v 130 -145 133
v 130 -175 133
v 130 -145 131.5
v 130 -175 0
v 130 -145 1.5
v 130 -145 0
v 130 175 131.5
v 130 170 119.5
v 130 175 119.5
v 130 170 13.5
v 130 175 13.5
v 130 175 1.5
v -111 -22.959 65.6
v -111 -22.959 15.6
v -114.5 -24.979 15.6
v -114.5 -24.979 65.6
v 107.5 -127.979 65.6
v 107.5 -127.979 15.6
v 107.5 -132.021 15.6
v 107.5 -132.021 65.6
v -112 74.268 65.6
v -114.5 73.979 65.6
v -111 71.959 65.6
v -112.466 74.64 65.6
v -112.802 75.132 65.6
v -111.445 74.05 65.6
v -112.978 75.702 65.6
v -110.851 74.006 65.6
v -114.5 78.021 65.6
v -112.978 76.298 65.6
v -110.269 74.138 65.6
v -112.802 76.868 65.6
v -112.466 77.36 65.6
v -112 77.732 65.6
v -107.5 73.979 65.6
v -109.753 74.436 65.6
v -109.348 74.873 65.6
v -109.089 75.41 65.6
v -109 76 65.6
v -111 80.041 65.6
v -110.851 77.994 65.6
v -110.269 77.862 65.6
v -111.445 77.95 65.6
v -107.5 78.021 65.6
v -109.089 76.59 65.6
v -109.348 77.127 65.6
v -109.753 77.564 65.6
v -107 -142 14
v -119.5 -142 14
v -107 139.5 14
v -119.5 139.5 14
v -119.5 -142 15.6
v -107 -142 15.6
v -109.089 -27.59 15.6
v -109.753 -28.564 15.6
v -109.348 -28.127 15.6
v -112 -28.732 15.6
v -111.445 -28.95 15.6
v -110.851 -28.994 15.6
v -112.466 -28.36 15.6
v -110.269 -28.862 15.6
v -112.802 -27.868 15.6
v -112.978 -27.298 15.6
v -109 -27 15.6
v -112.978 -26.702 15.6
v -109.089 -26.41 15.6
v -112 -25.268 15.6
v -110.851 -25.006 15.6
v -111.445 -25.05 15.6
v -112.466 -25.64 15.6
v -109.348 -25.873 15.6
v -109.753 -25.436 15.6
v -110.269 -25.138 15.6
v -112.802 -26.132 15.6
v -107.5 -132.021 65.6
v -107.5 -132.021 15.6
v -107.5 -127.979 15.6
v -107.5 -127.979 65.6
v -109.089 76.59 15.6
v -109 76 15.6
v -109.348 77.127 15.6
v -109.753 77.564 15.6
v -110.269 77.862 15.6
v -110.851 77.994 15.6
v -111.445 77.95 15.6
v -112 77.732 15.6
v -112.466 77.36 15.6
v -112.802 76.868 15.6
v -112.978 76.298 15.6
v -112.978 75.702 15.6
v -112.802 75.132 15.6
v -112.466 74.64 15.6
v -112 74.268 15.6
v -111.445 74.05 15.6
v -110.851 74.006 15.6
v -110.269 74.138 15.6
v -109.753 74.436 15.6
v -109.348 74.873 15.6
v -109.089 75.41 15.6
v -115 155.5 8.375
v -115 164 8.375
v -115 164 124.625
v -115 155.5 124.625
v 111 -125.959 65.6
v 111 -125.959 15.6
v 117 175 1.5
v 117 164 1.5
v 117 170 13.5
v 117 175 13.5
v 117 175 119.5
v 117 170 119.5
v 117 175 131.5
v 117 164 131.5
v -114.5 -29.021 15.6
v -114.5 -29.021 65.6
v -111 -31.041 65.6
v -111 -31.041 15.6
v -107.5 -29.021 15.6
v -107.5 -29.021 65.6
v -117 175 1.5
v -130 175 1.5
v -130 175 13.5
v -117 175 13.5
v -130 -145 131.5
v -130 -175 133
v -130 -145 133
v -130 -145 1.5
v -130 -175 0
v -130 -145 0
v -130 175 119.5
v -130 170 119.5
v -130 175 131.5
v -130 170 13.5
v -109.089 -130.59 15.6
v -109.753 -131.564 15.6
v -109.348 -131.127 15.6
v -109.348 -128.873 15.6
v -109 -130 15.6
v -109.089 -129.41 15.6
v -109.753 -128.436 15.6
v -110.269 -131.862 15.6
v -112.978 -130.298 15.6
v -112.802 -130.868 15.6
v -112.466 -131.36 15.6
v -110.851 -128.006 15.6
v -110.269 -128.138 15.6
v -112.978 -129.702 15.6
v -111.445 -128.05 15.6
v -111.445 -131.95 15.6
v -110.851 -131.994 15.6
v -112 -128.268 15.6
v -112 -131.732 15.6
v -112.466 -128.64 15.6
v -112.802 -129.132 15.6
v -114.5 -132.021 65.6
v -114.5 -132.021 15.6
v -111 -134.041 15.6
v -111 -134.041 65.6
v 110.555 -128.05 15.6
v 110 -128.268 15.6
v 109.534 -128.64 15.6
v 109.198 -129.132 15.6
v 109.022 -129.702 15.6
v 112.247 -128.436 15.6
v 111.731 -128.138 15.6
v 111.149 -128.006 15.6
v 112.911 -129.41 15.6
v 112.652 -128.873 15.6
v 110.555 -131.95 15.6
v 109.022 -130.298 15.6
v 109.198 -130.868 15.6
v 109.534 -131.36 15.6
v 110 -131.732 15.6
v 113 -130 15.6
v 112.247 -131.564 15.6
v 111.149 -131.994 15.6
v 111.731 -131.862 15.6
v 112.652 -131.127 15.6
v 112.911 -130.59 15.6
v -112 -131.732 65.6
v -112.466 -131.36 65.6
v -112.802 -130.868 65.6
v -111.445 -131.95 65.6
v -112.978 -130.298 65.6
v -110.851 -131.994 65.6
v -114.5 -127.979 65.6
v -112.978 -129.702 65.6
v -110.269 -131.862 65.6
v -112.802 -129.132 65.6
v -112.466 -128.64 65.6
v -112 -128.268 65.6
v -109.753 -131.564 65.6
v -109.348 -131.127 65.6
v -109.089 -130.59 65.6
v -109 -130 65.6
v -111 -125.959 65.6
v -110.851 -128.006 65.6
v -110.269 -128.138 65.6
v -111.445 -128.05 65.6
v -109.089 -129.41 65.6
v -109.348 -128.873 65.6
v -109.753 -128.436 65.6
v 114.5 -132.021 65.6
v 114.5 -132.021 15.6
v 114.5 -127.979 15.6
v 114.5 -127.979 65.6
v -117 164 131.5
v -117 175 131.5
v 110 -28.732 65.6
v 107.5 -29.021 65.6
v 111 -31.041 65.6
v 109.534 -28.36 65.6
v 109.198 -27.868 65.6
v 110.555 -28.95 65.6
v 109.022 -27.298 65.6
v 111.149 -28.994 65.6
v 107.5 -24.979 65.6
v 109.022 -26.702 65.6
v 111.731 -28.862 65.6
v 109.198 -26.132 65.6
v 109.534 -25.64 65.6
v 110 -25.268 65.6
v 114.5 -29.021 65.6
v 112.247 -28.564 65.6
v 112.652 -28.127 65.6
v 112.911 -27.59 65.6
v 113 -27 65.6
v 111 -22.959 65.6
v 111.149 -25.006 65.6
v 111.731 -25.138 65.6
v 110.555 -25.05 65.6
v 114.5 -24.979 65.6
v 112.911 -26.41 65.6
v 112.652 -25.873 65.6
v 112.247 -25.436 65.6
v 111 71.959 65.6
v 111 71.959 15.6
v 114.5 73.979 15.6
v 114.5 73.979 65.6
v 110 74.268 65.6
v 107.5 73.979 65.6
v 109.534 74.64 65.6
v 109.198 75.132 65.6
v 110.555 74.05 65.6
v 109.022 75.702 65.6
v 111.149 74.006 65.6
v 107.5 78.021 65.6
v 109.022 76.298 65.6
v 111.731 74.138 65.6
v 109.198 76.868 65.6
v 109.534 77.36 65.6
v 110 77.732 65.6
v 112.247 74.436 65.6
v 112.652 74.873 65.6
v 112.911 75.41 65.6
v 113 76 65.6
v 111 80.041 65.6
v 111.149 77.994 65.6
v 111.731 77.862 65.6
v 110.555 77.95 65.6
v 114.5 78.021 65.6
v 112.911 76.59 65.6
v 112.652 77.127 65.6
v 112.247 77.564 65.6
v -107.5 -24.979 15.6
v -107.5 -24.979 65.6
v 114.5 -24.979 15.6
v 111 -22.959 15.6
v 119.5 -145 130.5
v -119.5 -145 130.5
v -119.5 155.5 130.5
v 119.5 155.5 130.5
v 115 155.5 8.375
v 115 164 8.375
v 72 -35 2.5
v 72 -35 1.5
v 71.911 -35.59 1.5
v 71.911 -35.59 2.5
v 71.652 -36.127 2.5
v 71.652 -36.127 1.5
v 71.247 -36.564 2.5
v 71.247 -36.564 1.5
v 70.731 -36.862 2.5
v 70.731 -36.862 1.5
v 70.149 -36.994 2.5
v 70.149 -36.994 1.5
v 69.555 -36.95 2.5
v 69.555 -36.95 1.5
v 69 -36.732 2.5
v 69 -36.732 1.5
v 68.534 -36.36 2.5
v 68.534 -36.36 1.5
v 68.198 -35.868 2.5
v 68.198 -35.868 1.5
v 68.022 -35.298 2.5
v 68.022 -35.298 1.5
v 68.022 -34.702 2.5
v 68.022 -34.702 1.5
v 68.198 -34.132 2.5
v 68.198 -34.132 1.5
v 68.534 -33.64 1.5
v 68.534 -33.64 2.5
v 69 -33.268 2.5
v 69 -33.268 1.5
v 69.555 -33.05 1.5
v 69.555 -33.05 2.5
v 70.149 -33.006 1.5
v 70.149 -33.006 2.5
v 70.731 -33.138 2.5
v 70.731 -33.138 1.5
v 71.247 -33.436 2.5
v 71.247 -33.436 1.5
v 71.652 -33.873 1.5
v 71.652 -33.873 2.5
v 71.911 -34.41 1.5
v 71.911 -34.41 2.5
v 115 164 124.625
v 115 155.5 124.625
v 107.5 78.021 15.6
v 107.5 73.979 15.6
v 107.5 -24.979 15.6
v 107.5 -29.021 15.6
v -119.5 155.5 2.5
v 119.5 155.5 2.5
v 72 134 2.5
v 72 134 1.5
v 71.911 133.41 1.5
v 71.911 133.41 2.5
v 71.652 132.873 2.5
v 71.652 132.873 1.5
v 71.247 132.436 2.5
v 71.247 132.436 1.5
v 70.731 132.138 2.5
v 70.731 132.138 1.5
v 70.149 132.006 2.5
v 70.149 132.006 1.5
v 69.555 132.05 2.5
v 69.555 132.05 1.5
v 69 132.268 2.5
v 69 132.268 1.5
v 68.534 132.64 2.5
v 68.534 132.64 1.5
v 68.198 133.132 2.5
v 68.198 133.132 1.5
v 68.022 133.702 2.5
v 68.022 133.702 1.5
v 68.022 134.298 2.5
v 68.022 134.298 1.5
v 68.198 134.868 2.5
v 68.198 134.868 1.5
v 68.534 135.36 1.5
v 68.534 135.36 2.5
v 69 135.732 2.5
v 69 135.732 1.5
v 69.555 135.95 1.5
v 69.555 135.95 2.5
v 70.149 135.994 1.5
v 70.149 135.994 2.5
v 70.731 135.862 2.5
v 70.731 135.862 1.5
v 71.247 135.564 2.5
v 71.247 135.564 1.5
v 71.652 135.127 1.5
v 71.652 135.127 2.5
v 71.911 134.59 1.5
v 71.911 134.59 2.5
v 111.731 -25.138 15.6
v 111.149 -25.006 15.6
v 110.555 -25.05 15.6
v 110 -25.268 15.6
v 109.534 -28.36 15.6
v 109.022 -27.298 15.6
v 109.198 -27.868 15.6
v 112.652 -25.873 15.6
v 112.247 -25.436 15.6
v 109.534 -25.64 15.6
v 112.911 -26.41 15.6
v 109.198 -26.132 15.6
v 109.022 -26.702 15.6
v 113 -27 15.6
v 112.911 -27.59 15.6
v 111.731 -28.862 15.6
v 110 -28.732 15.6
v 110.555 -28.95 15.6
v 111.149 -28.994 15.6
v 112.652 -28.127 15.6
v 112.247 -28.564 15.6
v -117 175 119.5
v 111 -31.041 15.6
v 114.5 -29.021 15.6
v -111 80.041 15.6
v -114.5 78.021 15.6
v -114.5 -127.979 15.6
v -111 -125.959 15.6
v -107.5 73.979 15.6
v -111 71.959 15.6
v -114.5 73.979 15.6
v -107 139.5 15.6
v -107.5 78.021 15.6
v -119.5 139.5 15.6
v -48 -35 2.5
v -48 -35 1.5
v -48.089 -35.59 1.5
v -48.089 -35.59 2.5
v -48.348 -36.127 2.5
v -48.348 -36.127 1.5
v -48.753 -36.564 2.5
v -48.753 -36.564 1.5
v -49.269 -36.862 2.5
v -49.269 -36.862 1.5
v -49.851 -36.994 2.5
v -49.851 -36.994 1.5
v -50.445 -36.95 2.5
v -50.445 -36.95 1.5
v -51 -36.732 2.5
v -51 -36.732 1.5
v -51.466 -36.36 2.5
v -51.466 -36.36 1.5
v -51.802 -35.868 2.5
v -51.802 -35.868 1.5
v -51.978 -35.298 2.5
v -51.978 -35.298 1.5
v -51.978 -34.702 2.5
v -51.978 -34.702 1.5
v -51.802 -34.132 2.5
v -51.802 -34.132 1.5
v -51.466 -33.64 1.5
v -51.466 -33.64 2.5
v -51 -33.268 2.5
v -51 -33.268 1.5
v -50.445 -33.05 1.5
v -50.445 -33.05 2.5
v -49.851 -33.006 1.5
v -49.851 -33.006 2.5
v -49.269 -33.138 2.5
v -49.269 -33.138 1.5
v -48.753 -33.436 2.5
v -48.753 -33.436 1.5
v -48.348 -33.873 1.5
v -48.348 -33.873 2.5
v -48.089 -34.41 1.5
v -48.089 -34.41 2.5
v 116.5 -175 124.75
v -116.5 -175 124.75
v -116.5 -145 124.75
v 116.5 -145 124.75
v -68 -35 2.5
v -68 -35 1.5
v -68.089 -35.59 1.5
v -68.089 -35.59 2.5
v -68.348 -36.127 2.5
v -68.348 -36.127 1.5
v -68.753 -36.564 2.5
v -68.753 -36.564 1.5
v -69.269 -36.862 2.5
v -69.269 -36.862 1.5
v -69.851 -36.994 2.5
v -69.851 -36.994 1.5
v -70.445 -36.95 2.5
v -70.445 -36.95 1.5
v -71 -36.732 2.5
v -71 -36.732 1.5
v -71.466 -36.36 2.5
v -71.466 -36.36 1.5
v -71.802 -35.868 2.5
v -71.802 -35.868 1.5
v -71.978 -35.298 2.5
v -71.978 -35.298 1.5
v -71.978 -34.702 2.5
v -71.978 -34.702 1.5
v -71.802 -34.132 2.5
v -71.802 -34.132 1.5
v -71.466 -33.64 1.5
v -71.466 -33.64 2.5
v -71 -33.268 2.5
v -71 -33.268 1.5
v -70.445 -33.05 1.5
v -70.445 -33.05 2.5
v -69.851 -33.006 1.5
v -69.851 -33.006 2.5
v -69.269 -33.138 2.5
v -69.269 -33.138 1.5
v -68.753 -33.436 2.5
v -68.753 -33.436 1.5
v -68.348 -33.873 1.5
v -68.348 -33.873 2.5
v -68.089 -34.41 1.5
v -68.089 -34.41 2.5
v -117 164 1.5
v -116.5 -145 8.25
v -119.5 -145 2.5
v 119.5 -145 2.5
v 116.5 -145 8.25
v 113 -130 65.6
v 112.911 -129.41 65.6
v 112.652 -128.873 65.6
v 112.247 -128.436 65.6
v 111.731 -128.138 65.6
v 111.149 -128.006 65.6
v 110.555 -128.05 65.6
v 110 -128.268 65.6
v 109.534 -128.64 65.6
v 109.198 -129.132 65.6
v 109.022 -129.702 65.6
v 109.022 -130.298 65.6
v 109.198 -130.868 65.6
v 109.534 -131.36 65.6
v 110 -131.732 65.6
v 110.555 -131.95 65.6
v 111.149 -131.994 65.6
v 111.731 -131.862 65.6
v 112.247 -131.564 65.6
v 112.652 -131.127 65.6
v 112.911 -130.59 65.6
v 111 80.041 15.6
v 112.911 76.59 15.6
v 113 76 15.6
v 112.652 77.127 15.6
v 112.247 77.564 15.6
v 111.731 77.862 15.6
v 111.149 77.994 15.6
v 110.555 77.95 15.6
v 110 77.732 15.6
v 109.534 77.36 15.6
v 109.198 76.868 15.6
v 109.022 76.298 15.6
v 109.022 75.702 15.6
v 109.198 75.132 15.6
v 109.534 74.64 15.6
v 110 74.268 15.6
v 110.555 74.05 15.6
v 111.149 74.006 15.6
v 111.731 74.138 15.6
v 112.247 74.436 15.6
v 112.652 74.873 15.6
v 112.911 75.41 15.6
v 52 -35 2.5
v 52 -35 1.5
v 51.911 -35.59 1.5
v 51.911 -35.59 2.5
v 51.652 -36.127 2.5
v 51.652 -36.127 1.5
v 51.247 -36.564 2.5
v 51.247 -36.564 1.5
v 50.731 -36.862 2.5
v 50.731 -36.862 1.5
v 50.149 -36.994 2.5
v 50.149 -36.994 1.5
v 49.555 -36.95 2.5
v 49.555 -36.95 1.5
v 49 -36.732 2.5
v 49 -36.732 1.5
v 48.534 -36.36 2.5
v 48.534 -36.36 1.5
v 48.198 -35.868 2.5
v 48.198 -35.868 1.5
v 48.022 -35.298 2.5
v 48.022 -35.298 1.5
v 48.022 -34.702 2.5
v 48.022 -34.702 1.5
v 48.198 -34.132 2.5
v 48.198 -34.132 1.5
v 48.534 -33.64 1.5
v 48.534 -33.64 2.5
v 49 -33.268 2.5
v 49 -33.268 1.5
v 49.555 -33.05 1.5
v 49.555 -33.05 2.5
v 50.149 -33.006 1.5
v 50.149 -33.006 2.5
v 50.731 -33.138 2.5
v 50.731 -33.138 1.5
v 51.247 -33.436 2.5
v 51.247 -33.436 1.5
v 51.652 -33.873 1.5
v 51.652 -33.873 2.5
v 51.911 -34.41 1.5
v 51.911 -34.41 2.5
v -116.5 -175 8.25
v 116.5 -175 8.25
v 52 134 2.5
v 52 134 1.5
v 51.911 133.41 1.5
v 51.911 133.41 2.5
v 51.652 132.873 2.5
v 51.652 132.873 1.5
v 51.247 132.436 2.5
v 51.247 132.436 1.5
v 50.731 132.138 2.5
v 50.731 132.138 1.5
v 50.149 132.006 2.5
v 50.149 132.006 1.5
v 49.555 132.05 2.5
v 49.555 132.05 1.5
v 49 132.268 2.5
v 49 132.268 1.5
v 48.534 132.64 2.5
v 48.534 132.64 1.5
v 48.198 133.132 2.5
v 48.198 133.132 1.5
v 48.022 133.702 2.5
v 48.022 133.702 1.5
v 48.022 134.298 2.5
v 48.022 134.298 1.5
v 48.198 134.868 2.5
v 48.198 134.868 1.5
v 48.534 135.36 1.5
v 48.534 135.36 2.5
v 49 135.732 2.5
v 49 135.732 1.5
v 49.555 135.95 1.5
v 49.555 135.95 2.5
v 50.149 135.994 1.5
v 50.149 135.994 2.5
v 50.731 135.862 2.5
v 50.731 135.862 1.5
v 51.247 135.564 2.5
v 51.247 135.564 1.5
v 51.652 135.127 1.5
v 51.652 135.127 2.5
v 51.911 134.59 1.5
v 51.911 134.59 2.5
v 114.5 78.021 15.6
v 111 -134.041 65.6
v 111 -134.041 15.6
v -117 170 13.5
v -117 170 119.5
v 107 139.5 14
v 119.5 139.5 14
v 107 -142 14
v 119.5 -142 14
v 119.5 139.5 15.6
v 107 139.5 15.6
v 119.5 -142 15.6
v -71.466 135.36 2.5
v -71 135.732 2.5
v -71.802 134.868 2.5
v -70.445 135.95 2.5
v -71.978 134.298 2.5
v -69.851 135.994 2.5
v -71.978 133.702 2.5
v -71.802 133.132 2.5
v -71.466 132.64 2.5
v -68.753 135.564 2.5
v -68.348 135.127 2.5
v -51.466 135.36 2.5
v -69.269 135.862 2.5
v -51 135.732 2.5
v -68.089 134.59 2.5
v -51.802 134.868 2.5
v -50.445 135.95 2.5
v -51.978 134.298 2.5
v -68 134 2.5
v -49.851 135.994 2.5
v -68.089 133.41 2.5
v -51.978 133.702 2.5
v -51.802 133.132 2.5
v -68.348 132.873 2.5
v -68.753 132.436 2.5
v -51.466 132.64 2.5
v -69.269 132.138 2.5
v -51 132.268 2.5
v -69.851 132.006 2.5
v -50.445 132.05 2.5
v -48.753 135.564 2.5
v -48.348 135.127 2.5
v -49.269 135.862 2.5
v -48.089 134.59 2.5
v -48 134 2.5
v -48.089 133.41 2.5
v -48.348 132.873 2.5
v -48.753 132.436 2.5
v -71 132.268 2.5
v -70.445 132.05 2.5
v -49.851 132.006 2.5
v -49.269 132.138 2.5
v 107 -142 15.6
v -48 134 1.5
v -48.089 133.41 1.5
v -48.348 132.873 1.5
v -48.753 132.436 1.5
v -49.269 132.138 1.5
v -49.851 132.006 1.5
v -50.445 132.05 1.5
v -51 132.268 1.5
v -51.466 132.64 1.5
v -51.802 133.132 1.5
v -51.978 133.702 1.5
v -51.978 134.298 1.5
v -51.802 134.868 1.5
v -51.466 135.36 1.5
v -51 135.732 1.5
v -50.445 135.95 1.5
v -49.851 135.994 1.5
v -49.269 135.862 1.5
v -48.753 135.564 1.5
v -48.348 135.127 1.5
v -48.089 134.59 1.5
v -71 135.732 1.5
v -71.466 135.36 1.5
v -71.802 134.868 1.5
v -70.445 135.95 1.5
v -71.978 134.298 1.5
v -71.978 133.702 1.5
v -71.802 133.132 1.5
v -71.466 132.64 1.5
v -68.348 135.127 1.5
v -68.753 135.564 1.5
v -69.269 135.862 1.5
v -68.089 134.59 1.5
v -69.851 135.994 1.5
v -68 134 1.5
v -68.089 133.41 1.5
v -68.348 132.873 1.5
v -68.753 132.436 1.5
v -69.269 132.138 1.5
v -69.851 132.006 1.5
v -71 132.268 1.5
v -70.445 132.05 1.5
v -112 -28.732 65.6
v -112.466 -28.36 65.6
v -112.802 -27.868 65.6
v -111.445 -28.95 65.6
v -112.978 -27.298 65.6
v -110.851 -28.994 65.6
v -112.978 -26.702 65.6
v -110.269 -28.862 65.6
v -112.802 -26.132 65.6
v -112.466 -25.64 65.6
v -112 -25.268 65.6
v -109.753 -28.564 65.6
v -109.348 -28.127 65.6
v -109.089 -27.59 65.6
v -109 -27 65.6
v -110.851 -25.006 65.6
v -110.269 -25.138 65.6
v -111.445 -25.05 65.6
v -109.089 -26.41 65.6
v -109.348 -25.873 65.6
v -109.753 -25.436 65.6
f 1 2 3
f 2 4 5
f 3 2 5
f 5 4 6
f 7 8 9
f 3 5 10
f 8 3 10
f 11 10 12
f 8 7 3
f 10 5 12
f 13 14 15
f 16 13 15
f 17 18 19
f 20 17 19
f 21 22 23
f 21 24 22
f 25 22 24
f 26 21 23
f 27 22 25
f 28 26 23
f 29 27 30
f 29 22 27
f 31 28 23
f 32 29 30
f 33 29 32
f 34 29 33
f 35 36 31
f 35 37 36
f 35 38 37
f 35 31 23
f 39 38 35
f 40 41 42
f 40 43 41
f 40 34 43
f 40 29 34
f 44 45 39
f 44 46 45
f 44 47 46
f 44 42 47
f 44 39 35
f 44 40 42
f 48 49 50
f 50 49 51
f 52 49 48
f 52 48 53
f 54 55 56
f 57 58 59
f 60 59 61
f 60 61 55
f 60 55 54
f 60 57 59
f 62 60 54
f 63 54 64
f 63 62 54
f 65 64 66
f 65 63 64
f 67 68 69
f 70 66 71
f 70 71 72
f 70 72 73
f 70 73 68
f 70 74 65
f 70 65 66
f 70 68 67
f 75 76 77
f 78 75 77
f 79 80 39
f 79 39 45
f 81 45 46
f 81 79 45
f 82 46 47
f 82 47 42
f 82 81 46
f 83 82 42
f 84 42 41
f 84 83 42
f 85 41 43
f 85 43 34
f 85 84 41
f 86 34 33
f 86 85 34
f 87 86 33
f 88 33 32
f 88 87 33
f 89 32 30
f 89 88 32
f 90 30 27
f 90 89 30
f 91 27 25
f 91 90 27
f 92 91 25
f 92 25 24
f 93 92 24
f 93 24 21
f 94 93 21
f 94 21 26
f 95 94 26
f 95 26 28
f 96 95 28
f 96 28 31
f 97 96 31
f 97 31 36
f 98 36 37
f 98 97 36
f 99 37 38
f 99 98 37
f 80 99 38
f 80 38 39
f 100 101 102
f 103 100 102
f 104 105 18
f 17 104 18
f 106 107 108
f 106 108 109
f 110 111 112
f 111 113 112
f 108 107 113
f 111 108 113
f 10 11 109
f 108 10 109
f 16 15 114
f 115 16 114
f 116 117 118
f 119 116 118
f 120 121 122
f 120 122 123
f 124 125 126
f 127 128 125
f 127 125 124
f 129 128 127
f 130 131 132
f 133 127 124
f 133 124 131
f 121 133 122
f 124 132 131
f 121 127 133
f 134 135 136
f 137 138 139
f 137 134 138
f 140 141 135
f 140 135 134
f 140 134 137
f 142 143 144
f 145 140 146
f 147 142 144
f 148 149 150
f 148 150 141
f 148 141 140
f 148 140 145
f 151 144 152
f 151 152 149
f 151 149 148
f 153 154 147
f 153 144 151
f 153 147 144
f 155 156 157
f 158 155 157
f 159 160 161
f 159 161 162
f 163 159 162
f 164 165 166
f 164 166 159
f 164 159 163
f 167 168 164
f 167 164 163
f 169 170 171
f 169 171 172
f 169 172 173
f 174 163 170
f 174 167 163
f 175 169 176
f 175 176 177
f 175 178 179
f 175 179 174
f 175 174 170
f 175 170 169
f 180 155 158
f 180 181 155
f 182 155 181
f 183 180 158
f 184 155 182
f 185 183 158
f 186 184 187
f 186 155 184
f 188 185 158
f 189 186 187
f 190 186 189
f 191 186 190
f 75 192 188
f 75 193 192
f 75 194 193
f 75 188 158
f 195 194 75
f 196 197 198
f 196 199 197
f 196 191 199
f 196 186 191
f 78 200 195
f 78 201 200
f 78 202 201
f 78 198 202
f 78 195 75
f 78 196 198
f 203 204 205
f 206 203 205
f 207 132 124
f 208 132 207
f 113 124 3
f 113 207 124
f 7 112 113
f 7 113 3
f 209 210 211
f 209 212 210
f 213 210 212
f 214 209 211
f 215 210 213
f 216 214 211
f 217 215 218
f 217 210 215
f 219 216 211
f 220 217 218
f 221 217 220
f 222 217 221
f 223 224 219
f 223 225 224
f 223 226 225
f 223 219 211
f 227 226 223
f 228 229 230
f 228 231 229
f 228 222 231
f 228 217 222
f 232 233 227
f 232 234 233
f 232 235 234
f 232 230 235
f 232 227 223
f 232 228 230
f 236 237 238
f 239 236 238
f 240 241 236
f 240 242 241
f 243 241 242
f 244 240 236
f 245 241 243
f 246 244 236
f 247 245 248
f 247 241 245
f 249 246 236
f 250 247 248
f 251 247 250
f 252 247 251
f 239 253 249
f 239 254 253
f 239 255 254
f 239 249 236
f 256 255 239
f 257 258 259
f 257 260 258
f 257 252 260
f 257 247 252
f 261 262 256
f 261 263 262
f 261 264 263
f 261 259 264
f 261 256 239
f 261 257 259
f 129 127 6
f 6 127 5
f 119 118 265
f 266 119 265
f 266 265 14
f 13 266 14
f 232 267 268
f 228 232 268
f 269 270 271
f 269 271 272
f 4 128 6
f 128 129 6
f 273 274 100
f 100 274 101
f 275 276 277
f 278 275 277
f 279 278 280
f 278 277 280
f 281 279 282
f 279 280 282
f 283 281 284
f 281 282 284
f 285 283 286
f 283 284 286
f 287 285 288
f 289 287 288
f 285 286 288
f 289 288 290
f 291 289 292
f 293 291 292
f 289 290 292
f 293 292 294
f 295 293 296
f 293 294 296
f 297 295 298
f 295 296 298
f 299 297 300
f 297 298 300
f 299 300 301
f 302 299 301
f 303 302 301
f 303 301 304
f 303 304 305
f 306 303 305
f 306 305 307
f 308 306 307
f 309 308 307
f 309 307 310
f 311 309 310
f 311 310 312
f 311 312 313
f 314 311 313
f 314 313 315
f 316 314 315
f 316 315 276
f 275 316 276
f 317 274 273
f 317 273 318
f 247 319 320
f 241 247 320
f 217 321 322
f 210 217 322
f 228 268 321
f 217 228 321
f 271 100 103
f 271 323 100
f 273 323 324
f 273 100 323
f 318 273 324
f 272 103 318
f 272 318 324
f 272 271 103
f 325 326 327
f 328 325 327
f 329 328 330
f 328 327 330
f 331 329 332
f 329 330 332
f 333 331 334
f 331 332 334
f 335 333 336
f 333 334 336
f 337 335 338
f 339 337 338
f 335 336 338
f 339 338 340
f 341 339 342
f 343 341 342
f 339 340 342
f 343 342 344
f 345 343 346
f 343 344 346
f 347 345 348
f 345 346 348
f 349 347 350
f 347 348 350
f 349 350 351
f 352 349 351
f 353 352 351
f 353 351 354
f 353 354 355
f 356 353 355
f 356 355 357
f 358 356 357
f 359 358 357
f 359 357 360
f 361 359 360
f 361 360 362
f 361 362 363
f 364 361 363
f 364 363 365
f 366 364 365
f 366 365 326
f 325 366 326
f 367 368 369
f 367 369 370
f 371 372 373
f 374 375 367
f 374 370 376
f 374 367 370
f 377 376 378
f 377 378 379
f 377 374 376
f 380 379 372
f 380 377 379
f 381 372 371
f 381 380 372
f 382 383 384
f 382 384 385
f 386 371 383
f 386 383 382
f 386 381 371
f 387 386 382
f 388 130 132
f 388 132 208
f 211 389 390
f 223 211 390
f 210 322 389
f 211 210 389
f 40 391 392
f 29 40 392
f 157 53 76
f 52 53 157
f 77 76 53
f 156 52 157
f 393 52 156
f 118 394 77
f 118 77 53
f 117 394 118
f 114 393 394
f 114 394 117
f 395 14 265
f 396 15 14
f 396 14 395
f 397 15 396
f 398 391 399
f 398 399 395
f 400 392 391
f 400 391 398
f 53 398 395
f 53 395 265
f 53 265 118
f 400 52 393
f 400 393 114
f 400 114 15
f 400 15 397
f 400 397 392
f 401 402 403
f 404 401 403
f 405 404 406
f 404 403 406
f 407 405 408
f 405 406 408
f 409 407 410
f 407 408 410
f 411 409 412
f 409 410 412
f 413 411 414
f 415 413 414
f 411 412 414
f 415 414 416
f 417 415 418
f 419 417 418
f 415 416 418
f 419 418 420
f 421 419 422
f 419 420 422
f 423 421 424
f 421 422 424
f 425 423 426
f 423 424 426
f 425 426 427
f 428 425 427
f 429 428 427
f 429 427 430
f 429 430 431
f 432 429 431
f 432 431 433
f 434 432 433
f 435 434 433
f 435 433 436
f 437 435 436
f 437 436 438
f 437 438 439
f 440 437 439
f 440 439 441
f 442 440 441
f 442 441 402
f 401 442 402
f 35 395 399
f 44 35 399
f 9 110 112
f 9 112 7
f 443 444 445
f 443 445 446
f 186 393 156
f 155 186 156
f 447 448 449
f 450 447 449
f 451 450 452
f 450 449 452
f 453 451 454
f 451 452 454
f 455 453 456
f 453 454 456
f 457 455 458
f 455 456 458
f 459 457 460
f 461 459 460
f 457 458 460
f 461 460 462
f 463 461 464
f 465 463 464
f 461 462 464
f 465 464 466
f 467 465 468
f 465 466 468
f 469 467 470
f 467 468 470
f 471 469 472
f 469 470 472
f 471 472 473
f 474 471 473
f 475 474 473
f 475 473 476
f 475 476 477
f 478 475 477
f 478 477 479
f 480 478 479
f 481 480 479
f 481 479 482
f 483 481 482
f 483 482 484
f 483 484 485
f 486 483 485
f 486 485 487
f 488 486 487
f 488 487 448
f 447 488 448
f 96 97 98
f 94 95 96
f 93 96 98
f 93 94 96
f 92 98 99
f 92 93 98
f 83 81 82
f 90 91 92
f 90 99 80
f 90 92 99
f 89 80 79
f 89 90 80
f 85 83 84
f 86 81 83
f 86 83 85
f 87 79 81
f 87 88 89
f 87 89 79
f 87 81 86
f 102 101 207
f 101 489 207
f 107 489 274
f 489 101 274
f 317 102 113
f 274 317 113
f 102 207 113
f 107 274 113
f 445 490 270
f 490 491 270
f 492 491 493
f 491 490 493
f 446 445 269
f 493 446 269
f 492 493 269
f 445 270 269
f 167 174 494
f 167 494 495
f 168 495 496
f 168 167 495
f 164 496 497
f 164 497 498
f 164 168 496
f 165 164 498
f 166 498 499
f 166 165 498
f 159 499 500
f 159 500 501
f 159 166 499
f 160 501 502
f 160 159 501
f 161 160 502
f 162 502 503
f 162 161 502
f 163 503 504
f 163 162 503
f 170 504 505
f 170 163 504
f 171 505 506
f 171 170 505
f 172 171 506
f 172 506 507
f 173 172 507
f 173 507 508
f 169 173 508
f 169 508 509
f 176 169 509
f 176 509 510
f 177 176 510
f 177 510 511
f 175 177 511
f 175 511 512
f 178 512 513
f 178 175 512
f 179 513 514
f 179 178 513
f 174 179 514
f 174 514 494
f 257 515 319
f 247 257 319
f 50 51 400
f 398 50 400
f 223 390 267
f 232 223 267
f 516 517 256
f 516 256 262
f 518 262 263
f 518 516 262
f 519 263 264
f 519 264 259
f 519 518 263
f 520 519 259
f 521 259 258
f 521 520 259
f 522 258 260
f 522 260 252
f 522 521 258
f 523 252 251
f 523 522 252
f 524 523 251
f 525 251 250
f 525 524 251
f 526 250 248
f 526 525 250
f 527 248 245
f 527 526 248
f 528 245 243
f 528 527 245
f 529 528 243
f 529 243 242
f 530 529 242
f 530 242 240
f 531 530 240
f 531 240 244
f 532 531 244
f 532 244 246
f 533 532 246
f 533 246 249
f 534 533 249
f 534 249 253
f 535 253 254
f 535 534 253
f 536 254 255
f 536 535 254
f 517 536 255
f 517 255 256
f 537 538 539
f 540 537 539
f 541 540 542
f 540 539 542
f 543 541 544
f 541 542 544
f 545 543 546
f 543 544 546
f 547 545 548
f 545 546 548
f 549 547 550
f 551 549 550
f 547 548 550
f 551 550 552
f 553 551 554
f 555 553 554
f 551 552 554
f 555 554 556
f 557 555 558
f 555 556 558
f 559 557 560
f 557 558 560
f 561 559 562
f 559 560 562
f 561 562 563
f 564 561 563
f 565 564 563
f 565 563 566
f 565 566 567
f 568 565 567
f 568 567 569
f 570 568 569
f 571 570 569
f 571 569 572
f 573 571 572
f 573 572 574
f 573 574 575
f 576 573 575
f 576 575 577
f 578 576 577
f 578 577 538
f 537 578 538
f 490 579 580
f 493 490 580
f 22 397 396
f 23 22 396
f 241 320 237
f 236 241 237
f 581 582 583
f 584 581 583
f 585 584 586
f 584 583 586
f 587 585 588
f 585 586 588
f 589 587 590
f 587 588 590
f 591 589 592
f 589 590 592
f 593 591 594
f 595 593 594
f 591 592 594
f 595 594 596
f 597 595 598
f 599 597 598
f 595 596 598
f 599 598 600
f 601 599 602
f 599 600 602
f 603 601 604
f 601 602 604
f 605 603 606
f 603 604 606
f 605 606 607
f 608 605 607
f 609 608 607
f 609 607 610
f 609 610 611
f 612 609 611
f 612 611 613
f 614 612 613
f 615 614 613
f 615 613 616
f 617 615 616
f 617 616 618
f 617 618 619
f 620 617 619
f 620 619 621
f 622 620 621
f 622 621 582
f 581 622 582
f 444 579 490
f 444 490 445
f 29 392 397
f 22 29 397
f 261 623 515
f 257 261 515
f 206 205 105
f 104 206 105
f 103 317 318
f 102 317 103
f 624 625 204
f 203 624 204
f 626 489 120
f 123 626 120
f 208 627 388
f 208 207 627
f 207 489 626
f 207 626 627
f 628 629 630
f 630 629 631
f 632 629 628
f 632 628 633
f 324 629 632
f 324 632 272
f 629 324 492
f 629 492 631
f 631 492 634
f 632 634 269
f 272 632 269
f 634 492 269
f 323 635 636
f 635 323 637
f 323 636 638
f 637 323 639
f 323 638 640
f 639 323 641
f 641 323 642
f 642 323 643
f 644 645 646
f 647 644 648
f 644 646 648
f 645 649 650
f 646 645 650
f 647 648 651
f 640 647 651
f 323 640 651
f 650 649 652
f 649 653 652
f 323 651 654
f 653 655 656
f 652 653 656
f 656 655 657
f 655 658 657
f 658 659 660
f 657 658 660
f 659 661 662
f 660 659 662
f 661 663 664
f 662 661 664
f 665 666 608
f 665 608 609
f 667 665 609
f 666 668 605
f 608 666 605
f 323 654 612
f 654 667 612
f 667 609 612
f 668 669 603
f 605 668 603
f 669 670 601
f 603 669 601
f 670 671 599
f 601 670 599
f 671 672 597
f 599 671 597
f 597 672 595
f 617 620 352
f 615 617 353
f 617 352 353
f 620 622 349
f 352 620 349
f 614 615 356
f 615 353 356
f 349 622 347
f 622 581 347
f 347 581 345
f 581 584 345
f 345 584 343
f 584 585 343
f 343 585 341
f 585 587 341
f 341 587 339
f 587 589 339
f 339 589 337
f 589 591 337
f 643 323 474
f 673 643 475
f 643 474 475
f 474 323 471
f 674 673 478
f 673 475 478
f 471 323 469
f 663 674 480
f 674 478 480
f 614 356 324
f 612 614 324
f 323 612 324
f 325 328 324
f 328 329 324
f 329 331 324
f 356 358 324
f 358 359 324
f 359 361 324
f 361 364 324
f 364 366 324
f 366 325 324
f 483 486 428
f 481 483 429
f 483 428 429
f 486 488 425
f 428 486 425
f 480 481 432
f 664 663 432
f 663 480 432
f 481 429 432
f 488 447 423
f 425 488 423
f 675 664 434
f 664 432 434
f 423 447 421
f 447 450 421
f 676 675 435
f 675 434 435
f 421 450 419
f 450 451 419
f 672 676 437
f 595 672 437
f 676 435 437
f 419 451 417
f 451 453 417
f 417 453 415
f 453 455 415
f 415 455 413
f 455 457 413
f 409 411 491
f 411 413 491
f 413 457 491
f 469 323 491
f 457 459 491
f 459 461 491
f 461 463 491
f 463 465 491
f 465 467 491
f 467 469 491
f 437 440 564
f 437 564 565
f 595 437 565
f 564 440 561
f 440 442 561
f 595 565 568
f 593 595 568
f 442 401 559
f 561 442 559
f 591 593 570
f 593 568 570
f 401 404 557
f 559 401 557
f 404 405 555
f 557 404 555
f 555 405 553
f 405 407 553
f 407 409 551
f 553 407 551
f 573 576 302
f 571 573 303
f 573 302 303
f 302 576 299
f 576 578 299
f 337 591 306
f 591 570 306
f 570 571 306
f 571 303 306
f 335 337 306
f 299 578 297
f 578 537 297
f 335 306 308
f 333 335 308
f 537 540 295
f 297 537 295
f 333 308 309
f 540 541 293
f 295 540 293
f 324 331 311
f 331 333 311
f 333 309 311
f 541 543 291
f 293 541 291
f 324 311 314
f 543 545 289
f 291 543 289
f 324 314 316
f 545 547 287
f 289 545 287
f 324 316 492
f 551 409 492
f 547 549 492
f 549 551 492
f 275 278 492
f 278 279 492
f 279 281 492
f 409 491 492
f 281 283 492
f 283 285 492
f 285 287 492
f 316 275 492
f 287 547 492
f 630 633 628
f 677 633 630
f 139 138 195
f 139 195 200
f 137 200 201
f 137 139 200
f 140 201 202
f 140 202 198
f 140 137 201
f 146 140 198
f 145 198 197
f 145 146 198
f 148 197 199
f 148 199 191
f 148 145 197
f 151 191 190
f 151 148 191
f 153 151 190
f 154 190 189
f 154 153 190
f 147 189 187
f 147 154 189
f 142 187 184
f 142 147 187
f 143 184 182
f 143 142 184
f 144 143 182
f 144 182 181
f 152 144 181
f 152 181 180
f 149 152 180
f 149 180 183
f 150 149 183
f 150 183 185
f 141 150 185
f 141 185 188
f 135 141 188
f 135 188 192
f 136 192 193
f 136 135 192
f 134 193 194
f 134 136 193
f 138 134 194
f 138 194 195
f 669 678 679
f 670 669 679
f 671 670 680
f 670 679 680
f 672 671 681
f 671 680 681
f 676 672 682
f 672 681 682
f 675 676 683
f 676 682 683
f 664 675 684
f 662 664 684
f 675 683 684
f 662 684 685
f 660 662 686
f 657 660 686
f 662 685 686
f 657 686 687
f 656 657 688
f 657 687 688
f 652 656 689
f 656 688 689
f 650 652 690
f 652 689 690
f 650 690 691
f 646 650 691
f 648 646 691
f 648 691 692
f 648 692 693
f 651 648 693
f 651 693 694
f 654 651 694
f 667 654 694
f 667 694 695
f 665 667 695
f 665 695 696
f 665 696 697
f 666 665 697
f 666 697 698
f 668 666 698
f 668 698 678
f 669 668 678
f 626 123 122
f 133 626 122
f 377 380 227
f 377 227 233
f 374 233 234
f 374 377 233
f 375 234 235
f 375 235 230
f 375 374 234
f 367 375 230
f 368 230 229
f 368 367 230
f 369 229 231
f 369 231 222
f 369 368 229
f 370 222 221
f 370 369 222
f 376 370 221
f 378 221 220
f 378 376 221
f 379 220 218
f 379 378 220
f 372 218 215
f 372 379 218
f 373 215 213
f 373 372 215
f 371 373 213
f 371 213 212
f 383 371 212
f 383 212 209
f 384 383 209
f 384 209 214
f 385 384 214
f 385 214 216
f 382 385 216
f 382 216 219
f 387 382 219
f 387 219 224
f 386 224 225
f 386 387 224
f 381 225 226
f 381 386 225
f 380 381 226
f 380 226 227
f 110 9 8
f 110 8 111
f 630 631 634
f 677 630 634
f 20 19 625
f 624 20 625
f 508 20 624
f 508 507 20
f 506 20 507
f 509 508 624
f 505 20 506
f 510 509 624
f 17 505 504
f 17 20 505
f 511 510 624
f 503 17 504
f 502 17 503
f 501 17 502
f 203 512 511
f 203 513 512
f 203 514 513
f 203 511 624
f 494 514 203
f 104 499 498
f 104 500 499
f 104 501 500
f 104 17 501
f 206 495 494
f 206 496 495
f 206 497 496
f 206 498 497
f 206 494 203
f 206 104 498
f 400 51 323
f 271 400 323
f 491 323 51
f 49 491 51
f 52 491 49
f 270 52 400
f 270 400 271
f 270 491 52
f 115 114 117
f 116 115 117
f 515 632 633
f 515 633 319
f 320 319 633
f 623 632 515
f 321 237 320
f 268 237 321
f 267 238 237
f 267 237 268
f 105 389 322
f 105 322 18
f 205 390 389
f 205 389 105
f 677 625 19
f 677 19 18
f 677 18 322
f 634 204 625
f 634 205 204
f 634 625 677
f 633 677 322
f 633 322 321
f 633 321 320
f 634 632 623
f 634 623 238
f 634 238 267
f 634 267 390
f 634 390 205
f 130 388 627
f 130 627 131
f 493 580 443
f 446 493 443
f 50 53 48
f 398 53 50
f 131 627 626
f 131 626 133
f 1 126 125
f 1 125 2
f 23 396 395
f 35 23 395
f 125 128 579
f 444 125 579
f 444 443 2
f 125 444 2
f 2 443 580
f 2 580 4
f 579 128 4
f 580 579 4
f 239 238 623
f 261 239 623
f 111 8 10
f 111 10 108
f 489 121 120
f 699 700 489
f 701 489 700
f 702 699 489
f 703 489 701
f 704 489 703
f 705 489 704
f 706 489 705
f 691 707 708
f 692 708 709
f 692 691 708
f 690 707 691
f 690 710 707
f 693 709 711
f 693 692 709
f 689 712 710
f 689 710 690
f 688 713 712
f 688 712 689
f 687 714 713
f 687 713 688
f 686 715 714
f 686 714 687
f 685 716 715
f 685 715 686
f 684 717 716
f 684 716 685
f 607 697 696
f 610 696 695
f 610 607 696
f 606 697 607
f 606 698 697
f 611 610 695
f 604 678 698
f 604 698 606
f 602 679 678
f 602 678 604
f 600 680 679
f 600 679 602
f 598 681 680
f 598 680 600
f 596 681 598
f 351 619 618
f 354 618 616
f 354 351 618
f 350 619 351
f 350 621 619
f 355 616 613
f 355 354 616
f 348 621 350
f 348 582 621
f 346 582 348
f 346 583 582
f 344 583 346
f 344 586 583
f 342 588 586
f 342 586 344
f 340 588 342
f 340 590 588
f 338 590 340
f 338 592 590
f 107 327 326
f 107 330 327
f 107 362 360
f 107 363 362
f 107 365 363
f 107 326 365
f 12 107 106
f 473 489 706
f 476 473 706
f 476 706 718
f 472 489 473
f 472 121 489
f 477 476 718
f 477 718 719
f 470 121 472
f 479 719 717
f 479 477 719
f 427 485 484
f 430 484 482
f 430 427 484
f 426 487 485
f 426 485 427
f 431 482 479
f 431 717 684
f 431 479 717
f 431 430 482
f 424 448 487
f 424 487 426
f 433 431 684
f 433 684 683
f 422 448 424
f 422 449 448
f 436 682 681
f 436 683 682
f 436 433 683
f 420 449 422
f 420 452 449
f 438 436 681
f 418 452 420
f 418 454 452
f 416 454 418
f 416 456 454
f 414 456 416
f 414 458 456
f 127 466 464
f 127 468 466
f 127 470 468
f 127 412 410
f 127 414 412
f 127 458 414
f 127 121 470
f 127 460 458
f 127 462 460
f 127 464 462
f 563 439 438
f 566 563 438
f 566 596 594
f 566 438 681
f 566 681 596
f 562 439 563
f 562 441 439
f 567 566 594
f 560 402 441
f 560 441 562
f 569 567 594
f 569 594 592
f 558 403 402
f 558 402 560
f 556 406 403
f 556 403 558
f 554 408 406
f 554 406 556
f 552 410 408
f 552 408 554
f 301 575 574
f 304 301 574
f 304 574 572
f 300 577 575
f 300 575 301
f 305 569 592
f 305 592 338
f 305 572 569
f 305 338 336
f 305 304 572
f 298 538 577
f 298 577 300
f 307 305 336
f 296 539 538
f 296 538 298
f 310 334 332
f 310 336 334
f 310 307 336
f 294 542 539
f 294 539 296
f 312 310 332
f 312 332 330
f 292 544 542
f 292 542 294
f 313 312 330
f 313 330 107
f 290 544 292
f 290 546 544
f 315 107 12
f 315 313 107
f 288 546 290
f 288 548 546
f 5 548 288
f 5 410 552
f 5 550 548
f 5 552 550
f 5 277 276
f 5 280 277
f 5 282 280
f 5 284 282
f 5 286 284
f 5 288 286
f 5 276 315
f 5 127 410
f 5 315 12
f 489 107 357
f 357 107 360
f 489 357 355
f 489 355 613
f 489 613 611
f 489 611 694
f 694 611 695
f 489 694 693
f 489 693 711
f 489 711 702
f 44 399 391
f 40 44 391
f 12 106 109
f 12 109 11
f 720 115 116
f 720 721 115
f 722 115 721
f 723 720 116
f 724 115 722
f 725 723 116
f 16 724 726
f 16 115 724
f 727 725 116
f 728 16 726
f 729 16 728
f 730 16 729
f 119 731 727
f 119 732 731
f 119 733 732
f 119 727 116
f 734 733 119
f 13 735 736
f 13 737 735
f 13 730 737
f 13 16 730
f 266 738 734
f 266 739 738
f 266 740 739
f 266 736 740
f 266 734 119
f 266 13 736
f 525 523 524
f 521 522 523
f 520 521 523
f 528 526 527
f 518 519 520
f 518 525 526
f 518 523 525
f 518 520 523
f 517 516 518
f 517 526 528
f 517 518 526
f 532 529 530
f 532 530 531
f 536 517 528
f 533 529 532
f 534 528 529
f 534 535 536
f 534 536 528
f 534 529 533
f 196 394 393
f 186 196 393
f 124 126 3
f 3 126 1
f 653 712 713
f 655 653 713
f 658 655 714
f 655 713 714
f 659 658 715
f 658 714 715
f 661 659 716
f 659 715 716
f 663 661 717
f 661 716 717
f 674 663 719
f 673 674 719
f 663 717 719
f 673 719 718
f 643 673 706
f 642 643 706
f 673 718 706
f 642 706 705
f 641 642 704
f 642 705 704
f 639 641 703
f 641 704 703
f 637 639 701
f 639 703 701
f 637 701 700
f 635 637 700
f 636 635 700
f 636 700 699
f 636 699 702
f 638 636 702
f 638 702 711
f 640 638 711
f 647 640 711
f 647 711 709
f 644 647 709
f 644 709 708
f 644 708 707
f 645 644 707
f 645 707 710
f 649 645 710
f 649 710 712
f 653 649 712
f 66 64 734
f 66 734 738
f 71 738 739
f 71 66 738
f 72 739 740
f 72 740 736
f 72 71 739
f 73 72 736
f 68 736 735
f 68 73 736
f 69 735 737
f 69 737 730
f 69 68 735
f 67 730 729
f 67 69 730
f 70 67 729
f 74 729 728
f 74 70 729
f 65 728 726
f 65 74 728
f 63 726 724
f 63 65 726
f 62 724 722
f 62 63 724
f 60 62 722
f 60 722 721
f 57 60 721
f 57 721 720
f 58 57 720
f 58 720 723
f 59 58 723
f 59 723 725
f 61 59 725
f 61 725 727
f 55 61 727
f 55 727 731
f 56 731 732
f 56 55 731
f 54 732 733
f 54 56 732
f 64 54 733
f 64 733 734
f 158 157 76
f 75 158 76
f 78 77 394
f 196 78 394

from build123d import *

# Parameters (mm, degrees)
F0_W      = 260
F0_H      = 350
F1_DEPTH  = 133
F2_W      = 260
F2_H      = 330
F3_DEPTH  = 1.5
F4_W      = 260
F4_H      = 330
F5_DEPTH  = 1.5
F6_W      = 234
F6_H      = 11
F7_DEPTH  = 131.501
F10_R     = 2
F11_DEPTH = 25
F12_W     = 239
F12_H     = 128
F13_DEPTH = 330.5
F14_W     = 260
F14_H     = 133
F14_W_2   = 233
F14_H_2   = 116.5
F15_DEPTH = 30
F9_W      = 13
F9_H      = 106
F8_W      = 13
F8_H      = 106
F16_DEPTH = 5
F17_W     = 230
F17_H     = 116.25
F18_DEPTH = 25
F19_W     = 281.5
F19_H     = 1.6
F20_DEPTH = 12.5
F21_W     = 281.5
F21_H     = 1.6
F22_DEPTH = 12.5
F23_R     = 2
F24_DEPTH = 50


with BuildPart() as f1:
    # F0 (on Top) → F1 (new body)
    with BuildSketch(Plane.XY):
        Rectangle(F0_W, F0_H)
    extrude(amount=F1_DEPTH)

    # F2 (on face) → F3 (cut)
    with BuildSketch(Plane.XY.offset(133)):
        with Locations((0, 10)):
            Rectangle(F2_W, F2_H)
    extrude(amount=-F3_DEPTH, mode=Mode.SUBTRACT)

    # F4 (on face) → F5 (cut)
    with BuildSketch(Plane(origin=(0, 0, 0), x_dir=(1, 0, 0), z_dir=(0, 0, -1))):
        with Locations((0, -10)):
            Rectangle(F4_W, F4_H)
    extrude(amount=-F5_DEPTH, mode=Mode.SUBTRACT)

    # F6 (on face) → F7 (cut, through all)
    with BuildSketch(Plane.XY.offset(131.5)):
        with Locations((0, 169.5)):
            Rectangle(F6_W, F6_H)
    extrude(amount=-F7_DEPTH, mode=Mode.SUBTRACT)

    # F10 (on face) → F11 (cut)
    with BuildSketch(Plane(origin=(0, 0, 1.5), x_dir=(1, 0, 0), z_dir=(0, 0, -1))):
        with Locations((70, 35)):
            Circle(F10_R)
        with Locations((50, 35)):
            Circle(F10_R)
        with Locations((-70, 35)):
            Circle(F10_R)
        with Locations((-50, 35)):
            Circle(F10_R)
        with Locations((70, -134)):
            Circle(F10_R)
        with Locations((50, -134)):
            Circle(F10_R)
        with Locations((-50, -134)):
            Circle(F10_R)
        with Locations((-70, -134)):
            Circle(F10_R)
    extrude(amount=-F11_DEPTH, mode=Mode.SUBTRACT)

    # F12 (on face) → F13 (cut)
    with BuildSketch(Plane.XZ.offset(175)):
        with Locations((0, 66.5)):
            Rectangle(F12_W, F12_H)
    extrude(amount=-F13_DEPTH, mode=Mode.SUBTRACT)

    # F14 (on face) → F15 (join)
    with BuildSketch(Plane.XZ.offset(175)):
        with Locations((0, 66.5)):
            Rectangle(F14_W, F14_H)
        with Locations((0, 66.5)):
            Rectangle(F14_W_2, F14_H_2, mode=Mode.SUBTRACT)
    extrude(amount=-F15_DEPTH)

    # F9 (on face) + F8 (on face) → F16 (cut)
    with BuildSketch(Plane(origin=(0, 175, 0), x_dir=(-1, 0, 0), z_dir=(0, 1, 0))):
        with Locations((-123.5, 66.5)):
            Rectangle(F9_W, F9_H)
    with BuildSketch(Plane(origin=(0, 175, 0), x_dir=(-1, 0, 0), z_dir=(0, 1, 0))):
        with Locations((123.5, 66.5)):
            Rectangle(F8_W, F8_H)
    extrude(amount=-F16_DEPTH, mode=Mode.SUBTRACT)

    # F17 (on face) → F18 (cut)
    with BuildSketch(Plane(origin=(0, 175, 0), x_dir=(-1, 0, 0), z_dir=(0, 1, 0))):
        with Locations((0, 66.5)):
            Rectangle(F17_W, F17_H)
    extrude(amount=-F18_DEPTH, mode=Mode.SUBTRACT)

    # F19 (on face) → F20 (join)
    with BuildSketch(Plane.YZ.offset(-119.5)):
        with Locations((-1.25, 14.8)):
            Rectangle(F19_W, F19_H)
    extrude(amount=F20_DEPTH)

    # F21 (on face) → F22 (join)
    with BuildSketch(Plane(origin=(119.5, 0, 0), x_dir=(0, -1, 0), z_dir=(-1, 0, 0))):
        with Locations((1.25, 14.8)):
            Rectangle(F21_W, F21_H)
    extrude(amount=F22_DEPTH)

    # F23 (on face) → F24 (join)
    with BuildSketch(Plane.XY.offset(15.6)):
        Polygon((111, -134.041452), (114.5, -132.020726), (114.5, -127.979274), (111, -125.958548), (107.5, -127.979274), (107.5, -132.020726), align=None)
        with Locations((111, -130)):
            Circle(F23_R, mode=Mode.SUBTRACT)
        Polygon((111, 71.958548), (114.5, 73.979274), (114.5, 78.020726), (111, 80.041452), (107.5, 78.020726), (107.5, 73.979274), align=None)
        with Locations((111, 76)):
            Circle(F23_R, mode=Mode.SUBTRACT)
        Polygon((111, -31.041452), (114.5, -29.020726), (114.5, -24.979274), (111, -22.958548), (107.5, -24.979274), (107.5, -29.020726), align=None)
        with Locations((111, -27)):
            Circle(F23_R, mode=Mode.SUBTRACT)
        Polygon((-111, -134.041452), (-107.5, -132.020726), (-107.5, -127.979274), (-111, -125.958548), (-114.5, -127.979274), (-114.5, -132.020726), align=None)
        with Locations((-111, -130)):
            Circle(F23_R, mode=Mode.SUBTRACT)
        Polygon((-107.5, -29.020726), (-107.5, -24.979274), (-111, -22.958548), (-114.5, -24.979274), (-114.5, -29.020726), (-111, -31.041452), align=None)
        with Locations((-111, -27)):
            Circle(F23_R, mode=Mode.SUBTRACT)
        Polygon((-111, 71.958548), (-107.5, 73.979274), (-107.5, 78.020726), (-111, 80.041452), (-114.5, 78.020726), (-114.5, 73.979274), align=None)
        with Locations((-111, 76)):
            Circle(F23_R, mode=Mode.SUBTRACT)
    extrude(amount=F24_DEPTH)


solid = f1.part
